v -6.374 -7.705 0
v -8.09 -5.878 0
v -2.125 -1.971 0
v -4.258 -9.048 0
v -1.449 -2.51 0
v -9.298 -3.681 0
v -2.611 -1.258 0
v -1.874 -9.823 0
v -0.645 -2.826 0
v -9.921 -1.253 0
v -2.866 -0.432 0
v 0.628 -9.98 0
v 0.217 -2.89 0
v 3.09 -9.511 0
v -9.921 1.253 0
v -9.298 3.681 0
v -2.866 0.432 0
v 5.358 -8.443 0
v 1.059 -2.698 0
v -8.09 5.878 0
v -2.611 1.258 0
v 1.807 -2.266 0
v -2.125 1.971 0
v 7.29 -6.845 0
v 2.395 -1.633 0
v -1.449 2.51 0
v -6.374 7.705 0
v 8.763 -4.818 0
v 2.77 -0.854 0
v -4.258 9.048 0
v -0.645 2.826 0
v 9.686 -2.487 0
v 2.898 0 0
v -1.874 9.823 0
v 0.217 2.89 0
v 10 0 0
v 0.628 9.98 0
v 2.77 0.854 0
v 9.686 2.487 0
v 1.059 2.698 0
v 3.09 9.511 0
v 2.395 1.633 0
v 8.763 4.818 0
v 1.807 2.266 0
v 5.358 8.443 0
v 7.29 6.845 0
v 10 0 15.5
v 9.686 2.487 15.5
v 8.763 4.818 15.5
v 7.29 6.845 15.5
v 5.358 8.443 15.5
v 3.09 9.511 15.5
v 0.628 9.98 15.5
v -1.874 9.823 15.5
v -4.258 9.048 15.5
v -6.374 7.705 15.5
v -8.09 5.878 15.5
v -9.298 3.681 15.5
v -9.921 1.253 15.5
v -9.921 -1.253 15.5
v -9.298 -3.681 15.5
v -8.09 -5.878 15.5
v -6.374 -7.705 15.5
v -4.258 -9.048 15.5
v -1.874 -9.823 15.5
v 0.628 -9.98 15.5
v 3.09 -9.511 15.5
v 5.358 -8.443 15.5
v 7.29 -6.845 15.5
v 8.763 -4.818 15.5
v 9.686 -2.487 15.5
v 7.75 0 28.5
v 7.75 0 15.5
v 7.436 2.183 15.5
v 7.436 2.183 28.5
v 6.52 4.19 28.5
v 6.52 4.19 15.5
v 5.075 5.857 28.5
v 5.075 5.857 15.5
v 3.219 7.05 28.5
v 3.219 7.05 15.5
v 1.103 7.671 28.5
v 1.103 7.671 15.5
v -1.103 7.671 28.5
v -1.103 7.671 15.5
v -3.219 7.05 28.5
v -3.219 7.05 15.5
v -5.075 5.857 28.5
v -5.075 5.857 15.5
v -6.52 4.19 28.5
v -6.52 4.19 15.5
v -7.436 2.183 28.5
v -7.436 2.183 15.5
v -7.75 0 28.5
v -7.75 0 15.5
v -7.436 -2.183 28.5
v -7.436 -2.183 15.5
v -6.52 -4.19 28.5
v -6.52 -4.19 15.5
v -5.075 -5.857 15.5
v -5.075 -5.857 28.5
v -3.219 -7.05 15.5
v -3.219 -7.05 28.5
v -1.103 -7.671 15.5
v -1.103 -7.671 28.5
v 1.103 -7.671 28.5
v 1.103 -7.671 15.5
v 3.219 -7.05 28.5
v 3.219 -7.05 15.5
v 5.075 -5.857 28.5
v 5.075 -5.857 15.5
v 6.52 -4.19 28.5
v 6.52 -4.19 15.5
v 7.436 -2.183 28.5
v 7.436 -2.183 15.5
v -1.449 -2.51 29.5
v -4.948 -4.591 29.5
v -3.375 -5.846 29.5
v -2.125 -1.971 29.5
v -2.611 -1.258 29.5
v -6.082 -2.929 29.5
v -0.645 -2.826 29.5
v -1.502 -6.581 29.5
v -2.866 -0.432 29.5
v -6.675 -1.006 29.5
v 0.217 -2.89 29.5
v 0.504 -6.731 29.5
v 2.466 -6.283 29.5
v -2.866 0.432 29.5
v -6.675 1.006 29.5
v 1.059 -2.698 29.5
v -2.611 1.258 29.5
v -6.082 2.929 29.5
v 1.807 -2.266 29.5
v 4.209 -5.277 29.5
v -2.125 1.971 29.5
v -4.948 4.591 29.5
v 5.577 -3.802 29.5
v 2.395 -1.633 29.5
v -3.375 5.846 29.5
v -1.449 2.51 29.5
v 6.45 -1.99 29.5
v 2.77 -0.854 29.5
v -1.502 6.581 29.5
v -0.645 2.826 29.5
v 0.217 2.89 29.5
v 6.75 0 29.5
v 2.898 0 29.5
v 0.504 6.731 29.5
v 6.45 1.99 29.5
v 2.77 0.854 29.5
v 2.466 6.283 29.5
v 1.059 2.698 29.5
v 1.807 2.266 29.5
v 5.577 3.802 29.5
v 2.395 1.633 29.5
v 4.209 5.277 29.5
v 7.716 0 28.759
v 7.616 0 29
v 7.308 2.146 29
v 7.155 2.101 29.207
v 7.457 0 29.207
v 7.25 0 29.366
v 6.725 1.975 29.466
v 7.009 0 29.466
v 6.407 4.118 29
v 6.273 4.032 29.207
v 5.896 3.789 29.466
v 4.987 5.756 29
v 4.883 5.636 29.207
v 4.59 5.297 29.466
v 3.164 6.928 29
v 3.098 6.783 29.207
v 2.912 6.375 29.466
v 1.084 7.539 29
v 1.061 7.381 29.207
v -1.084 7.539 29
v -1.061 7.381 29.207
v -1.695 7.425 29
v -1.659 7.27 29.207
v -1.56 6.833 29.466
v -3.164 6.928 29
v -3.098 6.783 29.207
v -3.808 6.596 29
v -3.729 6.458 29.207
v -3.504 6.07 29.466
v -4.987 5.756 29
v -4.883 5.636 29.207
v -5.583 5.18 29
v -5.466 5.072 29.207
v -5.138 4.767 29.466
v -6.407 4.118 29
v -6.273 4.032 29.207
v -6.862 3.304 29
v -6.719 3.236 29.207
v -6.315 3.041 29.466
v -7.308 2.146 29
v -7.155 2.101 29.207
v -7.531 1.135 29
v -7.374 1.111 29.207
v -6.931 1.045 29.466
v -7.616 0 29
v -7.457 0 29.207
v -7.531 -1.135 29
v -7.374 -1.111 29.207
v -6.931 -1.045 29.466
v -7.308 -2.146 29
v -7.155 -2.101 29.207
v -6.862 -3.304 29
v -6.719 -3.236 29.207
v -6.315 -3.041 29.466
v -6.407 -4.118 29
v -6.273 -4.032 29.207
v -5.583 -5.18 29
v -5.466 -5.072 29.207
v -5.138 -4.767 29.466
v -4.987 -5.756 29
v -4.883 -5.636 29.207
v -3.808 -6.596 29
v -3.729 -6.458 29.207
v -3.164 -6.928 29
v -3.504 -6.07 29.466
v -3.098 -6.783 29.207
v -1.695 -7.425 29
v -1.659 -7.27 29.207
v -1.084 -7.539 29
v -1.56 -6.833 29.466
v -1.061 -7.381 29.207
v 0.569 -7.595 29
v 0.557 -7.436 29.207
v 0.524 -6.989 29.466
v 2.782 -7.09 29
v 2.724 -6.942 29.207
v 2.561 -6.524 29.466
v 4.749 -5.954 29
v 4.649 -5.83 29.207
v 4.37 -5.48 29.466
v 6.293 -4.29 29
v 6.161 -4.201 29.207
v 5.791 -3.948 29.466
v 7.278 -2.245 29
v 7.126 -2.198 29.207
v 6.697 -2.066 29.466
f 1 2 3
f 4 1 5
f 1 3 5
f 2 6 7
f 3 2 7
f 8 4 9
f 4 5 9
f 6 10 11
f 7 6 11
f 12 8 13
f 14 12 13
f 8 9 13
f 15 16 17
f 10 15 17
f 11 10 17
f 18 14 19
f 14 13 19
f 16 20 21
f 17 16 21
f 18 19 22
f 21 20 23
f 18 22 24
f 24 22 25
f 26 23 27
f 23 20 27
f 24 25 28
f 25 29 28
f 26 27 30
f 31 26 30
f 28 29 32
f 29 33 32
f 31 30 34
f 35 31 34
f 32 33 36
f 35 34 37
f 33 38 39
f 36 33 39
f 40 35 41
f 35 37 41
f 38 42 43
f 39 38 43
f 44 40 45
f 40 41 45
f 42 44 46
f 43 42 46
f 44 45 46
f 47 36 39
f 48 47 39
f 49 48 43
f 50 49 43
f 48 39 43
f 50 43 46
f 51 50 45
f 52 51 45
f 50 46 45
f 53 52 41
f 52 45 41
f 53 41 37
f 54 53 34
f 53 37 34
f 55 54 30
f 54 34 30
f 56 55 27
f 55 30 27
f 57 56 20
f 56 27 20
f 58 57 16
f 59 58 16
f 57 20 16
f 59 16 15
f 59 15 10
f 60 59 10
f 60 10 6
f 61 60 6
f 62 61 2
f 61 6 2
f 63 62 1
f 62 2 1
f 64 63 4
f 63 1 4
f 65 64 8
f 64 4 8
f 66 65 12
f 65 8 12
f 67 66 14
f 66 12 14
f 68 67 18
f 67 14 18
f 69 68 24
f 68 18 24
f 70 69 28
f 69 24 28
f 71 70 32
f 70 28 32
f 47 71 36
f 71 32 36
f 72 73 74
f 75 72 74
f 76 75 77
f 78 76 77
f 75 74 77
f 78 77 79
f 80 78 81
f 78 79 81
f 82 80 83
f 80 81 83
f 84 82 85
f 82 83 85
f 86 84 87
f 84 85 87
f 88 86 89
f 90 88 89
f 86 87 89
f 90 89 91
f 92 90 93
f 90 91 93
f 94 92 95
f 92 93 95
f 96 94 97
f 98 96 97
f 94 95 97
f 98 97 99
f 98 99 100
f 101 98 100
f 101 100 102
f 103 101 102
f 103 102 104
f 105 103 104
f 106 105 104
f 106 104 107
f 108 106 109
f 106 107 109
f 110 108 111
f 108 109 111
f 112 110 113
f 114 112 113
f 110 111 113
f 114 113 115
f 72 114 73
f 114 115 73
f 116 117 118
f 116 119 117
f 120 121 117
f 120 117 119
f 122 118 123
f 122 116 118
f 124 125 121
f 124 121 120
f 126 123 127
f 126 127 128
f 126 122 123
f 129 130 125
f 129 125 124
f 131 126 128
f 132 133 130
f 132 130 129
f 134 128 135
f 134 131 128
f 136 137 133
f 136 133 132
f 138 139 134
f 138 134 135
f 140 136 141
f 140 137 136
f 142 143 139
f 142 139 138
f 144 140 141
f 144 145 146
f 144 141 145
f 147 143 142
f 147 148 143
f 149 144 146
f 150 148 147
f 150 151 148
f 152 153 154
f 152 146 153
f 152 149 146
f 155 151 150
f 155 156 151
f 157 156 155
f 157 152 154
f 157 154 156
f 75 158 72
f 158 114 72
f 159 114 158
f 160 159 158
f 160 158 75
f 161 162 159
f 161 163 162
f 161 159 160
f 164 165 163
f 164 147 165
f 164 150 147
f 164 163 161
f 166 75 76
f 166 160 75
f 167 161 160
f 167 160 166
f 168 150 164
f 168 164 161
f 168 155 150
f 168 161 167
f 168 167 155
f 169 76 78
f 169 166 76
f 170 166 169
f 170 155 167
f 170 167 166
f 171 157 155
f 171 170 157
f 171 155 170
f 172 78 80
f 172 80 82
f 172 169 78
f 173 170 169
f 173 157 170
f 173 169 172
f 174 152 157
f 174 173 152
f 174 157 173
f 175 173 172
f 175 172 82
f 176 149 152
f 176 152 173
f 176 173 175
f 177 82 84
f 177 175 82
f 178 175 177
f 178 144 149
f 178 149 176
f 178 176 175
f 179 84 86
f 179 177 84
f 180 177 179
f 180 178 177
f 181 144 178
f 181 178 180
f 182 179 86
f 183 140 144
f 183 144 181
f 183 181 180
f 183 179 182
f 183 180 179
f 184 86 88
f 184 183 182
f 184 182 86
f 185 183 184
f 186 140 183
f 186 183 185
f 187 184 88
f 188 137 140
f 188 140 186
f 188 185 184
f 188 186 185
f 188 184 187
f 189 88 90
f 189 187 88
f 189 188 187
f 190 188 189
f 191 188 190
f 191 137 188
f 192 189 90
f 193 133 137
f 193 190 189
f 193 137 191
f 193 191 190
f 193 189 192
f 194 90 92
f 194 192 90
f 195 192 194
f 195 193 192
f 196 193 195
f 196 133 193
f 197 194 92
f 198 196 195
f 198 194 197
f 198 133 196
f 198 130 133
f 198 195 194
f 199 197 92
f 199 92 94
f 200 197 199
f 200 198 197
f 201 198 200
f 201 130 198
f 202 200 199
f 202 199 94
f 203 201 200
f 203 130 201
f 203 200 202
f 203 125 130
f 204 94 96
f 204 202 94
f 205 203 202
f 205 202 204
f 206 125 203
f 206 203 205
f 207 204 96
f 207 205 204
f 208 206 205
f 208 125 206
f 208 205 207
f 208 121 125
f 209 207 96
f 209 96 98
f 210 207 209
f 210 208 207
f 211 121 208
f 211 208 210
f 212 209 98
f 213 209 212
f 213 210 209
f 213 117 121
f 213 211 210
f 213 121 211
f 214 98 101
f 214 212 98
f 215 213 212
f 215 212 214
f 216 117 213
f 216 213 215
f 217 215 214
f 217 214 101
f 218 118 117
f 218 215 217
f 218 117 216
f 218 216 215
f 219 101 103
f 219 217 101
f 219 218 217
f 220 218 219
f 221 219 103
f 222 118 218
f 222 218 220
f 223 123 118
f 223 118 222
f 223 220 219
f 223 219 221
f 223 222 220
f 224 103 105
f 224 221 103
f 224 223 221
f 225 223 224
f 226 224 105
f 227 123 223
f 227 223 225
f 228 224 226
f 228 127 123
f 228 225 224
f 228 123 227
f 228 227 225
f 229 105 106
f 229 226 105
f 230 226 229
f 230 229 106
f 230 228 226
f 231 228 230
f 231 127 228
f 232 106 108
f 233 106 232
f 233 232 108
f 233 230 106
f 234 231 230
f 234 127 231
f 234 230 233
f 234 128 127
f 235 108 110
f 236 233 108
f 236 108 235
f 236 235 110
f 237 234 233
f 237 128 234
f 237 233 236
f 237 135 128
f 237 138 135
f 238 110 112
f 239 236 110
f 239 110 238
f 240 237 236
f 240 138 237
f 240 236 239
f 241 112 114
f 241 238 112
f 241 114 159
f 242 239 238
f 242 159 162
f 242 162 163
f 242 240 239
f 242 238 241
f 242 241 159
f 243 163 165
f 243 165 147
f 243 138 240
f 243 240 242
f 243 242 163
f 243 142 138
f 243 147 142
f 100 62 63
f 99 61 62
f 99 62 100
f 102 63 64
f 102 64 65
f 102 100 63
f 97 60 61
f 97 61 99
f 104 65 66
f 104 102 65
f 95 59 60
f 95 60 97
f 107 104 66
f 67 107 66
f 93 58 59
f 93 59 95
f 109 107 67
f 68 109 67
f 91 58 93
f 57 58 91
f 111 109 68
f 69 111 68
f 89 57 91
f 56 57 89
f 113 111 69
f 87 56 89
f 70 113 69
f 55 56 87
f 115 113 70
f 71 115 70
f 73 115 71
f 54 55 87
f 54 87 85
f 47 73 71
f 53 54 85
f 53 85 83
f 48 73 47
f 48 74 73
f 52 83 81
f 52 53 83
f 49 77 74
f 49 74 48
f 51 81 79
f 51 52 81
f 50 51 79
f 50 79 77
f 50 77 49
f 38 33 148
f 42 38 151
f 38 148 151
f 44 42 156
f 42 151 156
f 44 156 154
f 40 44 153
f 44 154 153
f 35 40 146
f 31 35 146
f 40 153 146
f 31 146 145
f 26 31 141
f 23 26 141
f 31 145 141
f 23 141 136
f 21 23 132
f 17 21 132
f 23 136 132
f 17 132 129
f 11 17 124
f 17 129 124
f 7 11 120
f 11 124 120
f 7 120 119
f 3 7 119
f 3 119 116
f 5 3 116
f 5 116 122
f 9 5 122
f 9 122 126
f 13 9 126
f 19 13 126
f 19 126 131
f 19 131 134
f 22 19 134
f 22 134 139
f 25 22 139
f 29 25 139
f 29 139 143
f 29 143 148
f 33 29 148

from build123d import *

# Parameters (mm, degrees)
F0_R     = 10
F1_DEPTH = 15.5
F2_R     = 7.75
F3_DEPTH = 14
F4_R     = 2.898353
F5_DEPTH = 31
F6_R     = 1


with BuildPart() as f1:
    # F0 (on Top) → F1 (new body)
    with BuildSketch(Plane.XY):
        Circle(F0_R)
    extrude(amount=F1_DEPTH)

    # F2 (on face) → F3 (join)
    with BuildSketch(Plane.XY.offset(15.5)):
        Circle(F2_R)
    extrude(amount=F3_DEPTH)

    # F4 (on face) → F5 (cut)
    with BuildSketch(Plane.XY.offset(29.5)):
        Circle(F4_R)
    extrude(amount=-F5_DEPTH, mode=Mode.SUBTRACT)

    # F6
    f6_edges = [f1.edges().sort_by_distance(p)[0] for p in [
        (-7.75, 0, 29.5),
    ]]
    fillet(f6_edges, radius=F6_R)


solid = f1.part
